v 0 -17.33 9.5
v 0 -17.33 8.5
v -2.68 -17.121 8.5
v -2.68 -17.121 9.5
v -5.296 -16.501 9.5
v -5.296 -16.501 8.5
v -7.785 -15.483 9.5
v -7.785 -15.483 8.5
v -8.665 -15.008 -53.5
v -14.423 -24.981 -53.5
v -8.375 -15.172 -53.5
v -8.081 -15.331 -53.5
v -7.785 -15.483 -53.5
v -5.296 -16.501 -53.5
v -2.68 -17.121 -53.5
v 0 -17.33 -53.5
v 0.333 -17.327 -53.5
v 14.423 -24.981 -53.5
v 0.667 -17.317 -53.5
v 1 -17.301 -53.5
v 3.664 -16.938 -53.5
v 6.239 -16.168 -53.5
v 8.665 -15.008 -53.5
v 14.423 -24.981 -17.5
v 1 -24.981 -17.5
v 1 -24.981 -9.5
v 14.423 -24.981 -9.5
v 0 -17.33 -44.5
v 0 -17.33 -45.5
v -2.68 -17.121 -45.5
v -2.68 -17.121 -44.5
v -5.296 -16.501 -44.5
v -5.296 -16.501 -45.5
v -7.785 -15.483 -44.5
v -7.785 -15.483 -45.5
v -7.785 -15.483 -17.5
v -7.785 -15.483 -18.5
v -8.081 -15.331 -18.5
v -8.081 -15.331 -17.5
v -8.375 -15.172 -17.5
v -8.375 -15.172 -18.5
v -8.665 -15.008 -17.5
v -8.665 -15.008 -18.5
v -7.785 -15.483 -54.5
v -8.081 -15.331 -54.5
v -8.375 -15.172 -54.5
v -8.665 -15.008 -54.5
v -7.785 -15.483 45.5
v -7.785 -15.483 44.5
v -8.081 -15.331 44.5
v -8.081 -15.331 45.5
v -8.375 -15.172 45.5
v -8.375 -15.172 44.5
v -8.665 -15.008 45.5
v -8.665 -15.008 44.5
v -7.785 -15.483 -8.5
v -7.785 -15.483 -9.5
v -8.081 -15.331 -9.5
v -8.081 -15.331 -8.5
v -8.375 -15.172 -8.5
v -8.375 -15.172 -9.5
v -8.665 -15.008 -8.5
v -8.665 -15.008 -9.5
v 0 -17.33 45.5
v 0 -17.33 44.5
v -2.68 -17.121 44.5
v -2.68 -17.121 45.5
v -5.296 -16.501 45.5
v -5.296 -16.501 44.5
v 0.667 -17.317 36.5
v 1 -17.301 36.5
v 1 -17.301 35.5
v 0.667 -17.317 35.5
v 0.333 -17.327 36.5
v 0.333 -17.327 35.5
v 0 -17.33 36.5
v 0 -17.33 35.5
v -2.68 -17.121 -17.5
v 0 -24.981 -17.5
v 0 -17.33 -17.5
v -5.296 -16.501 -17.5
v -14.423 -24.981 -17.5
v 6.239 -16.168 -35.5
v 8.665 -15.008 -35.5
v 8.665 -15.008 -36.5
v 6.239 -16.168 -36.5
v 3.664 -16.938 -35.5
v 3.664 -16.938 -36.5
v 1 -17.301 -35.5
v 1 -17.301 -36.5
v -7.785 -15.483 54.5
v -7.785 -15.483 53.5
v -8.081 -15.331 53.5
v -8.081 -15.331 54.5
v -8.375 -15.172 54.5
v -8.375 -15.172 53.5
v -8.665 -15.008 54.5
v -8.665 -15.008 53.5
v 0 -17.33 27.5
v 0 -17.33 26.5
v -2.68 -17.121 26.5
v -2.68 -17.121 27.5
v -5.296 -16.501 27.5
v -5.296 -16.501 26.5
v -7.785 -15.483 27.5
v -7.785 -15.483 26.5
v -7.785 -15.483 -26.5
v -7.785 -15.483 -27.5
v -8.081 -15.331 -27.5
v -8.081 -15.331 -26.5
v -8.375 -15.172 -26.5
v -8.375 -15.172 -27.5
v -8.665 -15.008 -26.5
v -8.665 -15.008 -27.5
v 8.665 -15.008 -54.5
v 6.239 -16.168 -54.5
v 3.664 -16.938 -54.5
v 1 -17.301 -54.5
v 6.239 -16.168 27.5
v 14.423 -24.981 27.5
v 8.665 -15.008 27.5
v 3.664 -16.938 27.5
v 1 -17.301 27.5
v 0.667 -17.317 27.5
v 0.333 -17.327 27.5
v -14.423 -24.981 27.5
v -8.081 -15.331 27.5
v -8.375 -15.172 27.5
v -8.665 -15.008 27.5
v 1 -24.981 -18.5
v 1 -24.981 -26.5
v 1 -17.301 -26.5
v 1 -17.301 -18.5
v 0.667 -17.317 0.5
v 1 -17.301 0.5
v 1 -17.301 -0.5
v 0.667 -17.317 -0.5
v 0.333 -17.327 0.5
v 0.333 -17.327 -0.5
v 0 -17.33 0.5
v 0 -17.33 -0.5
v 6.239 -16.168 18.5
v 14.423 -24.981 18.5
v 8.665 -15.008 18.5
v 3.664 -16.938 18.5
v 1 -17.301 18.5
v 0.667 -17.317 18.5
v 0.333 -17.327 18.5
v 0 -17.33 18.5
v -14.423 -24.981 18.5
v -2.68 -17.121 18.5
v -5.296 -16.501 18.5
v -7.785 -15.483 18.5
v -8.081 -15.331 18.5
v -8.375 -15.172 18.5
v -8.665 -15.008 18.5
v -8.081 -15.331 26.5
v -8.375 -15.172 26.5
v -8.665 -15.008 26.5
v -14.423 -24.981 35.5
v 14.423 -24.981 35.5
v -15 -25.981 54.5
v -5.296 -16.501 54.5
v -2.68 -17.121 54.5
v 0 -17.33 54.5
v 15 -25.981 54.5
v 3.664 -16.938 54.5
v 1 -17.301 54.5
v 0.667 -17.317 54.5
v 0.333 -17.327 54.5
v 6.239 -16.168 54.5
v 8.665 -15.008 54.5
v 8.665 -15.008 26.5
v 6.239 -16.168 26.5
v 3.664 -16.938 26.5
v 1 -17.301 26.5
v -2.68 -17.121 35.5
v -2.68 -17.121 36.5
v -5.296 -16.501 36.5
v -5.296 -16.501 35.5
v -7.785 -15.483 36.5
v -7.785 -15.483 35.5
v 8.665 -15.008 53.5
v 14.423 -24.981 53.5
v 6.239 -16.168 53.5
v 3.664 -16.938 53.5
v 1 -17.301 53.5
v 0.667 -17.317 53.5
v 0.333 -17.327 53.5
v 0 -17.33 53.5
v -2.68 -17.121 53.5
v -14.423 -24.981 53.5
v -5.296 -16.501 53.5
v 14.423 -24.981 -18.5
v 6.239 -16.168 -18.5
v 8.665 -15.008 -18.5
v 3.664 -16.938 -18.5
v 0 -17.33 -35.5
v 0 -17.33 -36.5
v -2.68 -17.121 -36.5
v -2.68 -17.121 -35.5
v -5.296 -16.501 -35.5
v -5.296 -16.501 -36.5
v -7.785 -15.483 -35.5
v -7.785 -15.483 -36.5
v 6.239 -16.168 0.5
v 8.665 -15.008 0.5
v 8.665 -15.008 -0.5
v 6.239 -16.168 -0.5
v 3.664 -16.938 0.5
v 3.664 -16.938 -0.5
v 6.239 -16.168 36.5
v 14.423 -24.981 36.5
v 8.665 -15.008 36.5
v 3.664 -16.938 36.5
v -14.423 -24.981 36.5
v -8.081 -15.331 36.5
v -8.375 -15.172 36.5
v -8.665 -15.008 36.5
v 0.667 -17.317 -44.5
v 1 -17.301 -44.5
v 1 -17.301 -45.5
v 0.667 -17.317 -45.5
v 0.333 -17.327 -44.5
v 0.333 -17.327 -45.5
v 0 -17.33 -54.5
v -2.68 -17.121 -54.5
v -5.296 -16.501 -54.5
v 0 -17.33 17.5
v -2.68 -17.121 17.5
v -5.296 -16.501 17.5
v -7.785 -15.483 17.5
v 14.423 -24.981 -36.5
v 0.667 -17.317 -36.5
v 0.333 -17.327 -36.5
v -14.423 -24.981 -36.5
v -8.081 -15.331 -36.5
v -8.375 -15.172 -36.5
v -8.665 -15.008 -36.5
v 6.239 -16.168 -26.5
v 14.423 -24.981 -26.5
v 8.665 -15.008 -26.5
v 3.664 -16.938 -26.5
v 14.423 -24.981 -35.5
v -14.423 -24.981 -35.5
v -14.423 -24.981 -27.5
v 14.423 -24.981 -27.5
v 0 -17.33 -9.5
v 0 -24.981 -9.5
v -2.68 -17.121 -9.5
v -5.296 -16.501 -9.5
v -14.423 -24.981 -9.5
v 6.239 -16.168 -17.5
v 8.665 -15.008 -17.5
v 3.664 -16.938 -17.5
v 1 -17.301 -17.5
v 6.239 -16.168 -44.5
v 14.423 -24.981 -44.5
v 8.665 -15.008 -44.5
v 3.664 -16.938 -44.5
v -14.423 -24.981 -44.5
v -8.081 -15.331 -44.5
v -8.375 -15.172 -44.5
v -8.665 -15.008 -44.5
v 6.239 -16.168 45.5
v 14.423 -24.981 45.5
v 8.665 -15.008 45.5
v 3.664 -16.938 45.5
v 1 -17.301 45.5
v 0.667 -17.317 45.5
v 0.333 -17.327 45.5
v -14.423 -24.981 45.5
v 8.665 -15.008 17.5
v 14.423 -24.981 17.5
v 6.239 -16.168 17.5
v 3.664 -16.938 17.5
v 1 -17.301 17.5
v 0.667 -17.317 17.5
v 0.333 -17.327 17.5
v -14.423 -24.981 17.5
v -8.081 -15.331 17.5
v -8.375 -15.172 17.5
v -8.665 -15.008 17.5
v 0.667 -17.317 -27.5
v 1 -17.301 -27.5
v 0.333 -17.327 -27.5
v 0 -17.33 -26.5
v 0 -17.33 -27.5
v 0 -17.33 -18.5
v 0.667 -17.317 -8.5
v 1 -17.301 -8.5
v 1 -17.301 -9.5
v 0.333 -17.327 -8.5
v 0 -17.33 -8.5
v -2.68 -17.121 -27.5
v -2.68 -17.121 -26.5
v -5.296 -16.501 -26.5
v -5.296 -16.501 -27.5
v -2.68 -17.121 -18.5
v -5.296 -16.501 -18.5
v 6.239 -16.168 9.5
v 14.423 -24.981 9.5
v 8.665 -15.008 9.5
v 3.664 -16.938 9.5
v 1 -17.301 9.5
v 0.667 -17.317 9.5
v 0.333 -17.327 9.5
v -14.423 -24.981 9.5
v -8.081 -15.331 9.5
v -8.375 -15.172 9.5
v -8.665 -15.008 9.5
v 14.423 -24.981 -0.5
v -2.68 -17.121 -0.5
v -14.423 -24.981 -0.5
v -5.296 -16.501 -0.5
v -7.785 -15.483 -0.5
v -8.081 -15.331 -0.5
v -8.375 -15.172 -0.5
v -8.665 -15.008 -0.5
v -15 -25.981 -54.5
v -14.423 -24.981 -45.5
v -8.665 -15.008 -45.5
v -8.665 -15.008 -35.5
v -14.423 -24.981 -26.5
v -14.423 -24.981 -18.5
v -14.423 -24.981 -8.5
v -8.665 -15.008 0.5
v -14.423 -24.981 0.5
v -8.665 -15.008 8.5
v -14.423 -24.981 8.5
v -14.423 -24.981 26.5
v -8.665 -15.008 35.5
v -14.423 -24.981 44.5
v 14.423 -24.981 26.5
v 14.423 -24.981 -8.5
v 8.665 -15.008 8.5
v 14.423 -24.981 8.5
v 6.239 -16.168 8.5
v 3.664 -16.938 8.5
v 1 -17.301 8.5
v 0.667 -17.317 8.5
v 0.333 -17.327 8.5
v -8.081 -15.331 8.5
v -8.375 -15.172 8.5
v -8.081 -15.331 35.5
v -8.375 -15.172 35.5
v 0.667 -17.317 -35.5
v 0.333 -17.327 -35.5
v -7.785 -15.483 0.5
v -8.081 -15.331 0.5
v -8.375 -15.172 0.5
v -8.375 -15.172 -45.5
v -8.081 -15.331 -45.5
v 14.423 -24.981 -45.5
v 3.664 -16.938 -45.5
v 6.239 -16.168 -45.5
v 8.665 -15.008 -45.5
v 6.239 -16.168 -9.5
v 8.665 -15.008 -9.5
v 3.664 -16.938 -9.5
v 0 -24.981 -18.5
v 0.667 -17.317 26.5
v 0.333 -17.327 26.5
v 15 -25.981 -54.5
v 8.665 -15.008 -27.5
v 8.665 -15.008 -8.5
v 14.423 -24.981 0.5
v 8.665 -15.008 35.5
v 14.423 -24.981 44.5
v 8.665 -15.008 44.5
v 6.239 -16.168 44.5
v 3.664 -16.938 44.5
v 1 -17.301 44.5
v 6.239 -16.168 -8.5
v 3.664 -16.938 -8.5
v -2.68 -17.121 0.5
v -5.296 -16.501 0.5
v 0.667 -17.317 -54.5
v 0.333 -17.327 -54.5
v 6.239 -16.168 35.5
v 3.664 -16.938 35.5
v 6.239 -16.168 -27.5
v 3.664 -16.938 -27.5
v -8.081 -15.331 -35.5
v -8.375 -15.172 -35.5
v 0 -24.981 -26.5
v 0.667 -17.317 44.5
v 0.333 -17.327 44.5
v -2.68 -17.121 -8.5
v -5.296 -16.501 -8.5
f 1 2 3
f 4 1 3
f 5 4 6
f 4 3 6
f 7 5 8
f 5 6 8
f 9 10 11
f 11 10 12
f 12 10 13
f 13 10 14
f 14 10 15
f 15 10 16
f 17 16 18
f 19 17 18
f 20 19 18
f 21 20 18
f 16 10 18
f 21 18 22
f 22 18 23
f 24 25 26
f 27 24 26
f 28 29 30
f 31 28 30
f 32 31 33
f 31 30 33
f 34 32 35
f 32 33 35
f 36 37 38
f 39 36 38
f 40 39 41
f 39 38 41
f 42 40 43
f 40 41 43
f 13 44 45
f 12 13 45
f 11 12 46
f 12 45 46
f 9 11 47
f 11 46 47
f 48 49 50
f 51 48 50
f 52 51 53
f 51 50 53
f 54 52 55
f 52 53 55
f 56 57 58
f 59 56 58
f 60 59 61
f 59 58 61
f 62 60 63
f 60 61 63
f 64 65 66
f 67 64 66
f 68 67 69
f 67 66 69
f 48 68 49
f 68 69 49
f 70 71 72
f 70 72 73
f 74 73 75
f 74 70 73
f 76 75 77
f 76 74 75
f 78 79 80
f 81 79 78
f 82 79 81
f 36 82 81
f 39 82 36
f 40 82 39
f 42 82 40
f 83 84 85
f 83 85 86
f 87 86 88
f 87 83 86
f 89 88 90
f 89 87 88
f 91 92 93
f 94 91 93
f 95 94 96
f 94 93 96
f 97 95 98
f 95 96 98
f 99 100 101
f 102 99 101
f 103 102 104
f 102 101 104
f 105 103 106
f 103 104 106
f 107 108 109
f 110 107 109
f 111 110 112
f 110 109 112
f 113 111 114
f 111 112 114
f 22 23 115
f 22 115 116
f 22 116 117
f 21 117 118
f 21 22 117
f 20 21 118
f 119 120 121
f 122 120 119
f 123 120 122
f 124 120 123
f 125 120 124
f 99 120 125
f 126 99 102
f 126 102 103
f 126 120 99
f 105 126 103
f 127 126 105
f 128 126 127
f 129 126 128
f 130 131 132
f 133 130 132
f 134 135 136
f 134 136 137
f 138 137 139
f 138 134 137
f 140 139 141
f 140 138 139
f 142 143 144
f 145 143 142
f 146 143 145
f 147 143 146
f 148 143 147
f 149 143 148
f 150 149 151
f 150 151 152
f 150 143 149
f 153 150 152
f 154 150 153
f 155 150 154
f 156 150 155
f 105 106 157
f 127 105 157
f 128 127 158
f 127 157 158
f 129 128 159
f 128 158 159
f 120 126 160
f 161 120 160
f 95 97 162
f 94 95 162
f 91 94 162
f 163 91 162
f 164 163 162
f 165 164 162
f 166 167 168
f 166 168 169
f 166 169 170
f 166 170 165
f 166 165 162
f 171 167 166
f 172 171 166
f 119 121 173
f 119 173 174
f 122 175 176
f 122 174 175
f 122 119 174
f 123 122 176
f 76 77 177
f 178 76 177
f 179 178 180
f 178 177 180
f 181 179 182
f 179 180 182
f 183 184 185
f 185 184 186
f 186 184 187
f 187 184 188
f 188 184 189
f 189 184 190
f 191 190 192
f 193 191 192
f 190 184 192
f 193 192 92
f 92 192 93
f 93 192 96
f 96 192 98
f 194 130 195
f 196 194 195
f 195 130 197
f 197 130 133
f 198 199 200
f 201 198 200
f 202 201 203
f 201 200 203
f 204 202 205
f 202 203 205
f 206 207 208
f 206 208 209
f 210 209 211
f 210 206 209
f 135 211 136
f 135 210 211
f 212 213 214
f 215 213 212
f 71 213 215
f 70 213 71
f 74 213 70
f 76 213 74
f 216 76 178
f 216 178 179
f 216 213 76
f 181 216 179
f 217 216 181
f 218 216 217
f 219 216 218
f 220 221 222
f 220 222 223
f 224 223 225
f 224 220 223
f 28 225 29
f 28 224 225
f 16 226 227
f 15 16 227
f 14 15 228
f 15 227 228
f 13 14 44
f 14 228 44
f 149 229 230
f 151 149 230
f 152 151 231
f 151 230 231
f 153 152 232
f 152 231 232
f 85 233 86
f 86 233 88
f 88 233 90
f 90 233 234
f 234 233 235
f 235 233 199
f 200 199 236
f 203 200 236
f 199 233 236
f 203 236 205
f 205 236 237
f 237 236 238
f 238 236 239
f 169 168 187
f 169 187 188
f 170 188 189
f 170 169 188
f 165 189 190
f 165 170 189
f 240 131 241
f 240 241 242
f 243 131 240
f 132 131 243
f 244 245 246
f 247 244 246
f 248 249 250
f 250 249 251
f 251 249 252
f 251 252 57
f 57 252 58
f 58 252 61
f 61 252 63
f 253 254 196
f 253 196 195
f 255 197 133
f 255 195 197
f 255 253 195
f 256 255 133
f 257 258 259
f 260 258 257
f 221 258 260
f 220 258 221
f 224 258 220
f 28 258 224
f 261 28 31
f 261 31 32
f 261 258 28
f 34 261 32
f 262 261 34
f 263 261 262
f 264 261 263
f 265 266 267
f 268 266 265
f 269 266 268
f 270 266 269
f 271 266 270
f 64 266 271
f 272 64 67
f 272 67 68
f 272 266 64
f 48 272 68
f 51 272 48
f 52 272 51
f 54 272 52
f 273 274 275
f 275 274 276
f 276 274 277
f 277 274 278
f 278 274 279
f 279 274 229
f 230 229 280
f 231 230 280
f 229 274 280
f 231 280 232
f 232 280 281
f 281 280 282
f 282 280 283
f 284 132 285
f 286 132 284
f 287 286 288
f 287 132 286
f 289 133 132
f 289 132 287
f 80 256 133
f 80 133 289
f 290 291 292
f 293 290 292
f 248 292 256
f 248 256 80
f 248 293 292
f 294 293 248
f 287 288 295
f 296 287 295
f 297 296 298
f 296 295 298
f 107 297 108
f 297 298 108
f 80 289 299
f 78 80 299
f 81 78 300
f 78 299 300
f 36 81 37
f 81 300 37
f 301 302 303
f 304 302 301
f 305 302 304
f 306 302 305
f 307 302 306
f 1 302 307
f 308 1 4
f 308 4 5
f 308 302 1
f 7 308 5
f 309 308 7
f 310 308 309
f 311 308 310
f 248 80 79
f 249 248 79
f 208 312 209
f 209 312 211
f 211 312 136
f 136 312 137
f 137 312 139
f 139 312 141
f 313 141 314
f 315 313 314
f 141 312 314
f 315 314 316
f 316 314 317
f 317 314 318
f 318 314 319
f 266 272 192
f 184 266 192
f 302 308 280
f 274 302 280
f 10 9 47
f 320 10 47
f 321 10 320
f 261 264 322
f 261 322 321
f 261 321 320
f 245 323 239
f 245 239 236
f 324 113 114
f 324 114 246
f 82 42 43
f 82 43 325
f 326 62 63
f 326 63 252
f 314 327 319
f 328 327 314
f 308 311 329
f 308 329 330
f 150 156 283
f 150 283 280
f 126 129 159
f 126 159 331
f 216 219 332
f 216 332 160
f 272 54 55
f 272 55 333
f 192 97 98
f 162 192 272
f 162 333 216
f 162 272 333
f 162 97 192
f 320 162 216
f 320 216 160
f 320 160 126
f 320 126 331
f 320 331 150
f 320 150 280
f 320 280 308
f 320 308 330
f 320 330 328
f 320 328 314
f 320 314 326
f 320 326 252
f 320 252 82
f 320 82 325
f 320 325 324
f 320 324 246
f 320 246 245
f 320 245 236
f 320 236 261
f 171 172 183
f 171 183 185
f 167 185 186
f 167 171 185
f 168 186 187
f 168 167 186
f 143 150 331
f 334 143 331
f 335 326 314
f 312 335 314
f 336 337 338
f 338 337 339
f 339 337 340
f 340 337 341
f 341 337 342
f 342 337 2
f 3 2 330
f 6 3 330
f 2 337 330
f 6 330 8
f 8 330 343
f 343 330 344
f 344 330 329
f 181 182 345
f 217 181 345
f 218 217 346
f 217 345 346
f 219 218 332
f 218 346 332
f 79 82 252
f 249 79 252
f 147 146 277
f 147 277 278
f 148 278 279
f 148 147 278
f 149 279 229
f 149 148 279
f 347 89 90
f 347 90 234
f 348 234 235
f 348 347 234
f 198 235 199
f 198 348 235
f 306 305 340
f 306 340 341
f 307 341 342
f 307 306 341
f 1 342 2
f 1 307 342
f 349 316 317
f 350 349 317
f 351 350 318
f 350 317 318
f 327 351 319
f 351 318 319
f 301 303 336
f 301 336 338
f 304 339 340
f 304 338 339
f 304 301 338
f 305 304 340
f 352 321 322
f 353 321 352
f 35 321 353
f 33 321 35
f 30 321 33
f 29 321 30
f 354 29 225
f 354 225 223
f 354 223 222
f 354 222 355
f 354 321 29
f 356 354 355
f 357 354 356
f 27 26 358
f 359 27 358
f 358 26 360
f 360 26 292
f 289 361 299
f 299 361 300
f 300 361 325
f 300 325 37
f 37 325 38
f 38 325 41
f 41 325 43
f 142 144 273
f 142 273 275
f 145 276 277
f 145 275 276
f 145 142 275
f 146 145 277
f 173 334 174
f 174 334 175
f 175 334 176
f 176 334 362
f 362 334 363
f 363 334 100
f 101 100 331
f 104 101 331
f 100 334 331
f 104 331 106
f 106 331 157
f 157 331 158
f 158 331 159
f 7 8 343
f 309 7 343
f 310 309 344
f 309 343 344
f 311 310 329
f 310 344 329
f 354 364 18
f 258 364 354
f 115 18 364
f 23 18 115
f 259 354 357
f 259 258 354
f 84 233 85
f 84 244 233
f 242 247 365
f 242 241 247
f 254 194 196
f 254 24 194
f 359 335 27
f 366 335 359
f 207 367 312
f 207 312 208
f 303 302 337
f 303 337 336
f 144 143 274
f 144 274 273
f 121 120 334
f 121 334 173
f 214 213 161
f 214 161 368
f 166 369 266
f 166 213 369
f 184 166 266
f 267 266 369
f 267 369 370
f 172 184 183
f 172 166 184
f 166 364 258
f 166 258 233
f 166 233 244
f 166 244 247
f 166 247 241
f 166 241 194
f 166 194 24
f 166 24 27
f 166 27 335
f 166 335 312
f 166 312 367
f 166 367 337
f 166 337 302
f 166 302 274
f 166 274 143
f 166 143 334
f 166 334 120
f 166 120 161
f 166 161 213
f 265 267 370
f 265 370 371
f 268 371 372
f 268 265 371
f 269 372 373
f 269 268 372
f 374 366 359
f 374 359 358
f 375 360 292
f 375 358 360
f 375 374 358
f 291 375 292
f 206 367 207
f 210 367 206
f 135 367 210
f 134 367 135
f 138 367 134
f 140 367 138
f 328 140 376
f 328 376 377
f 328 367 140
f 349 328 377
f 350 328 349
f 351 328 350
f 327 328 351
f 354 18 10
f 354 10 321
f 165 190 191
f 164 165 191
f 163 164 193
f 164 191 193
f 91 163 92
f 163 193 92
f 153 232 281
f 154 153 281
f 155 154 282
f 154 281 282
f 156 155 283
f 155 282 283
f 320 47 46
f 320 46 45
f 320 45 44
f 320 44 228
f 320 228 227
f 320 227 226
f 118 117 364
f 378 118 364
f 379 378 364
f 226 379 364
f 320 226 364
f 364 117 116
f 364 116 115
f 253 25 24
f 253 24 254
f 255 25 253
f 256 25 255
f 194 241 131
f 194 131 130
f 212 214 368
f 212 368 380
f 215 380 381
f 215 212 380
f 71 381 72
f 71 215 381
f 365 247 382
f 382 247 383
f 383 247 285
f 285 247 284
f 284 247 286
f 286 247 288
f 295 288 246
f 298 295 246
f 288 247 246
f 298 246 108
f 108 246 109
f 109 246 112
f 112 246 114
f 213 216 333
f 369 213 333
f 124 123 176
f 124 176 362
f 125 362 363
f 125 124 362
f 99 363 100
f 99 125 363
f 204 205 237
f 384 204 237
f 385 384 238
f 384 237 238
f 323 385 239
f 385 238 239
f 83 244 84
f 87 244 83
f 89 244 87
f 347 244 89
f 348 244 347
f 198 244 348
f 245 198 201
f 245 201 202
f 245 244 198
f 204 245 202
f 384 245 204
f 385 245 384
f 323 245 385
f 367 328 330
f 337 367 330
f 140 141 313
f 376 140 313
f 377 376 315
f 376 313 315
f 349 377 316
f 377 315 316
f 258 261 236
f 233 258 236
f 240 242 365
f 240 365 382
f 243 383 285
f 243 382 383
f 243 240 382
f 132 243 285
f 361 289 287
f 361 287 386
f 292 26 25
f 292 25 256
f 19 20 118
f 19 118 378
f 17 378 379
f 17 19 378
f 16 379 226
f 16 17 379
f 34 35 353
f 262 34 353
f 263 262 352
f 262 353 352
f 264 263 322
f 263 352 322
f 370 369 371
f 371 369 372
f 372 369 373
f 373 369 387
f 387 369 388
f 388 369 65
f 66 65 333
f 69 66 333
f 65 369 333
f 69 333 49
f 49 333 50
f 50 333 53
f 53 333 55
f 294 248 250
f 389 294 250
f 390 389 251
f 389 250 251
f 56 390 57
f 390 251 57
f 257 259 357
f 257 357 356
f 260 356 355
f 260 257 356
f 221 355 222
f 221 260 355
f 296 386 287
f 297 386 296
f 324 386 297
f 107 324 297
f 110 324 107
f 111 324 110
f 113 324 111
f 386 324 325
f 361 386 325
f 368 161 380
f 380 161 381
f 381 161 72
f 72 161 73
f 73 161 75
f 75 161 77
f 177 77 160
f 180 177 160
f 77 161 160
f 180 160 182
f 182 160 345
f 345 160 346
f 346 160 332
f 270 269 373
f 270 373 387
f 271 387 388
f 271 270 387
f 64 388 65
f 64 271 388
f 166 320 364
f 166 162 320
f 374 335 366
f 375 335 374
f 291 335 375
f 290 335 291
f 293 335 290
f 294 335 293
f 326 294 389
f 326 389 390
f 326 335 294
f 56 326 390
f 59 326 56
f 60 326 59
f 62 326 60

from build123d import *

# Parameters (mm, degrees)
F1_DEPTH = 54.5
F2_W     = 11
F2_H     = 8
F3_DEPTH = 17.5
F4_START = -9.5
F4_DEPTH = 17.7


with BuildPart() as f1:
    # F0 (on Top) → F1 (new body, symmetric)
    with BuildSketch(Plane.XY):
        with BuildLine():
            Line((-15, -25.9807621135), (-13.8452994616, -25.9807621135))
            Line((-13.8452994616, -25.9807621135), (-7.7845367167, -15.4832131067))
            ThreePointArc((-7.7845367167, -15.4832131067), (-8.2281965887, -15.2520713642), (-8.665, -15.0082202476))
            Line((-8.665, -15.0082202476), (-15, -25.9807621135))
        make_face()
        with BuildLine():
            Line((-13.8452994616, -25.9807621135), (0, -25.9807621135))
            Line((0, -25.9807621135), (0, -17.33))
            ThreePointArc((0, -17.33), (-4.0003010425, -16.8619836191), (-7.7845367167, -15.4832131067))
            Line((-7.7845367167, -15.4832131067), (-13.8452994616, -25.9807621135))
        make_face()
        with BuildLine():
            Line((0, -25.9807621135), (1, -25.9807621135))
            Line((1, -25.9807621135), (1, -17.3011242409))
            ThreePointArc((1, -17.3011242409), (0.5002084089, -17.3227795561), (0, -17.33))
            Line((0, -17.33), (0, -25.9807621135))
        make_face()
        with BuildLine():
            Line((1, -25.9807621135), (15, -25.9807621135))
            Line((15, -25.9807621135), (8.665, -15.0082202476))
            ThreePointArc((8.665, -15.0082202476), (4.9666294839, -16.6030566936), (1, -17.3011242409))
            Line((1, -17.3011242409), (1, -25.9807621135))
        make_face()
    extrude(amount=F1_DEPTH, both=True)

    # F2 (on Right) → F3 (cut, symmetric)
    with BuildSketch(Plane.YZ):
        with Locations((-19.4807621135, 49.5)):
            Rectangle(F2_W, F2_H)
        with Locations((-19.4807621135, 40.5)):
            Rectangle(F2_W, F2_H)
        with Locations((-19.4807621135, 31.5)):
            Rectangle(F2_W, F2_H)
        with Locations((-19.4807621135, 22.5)):
            Rectangle(F2_W, F2_H)
        with Locations((-19.4807621135, 13.5)):
            Rectangle(F2_W, F2_H)
        with Locations((-19.4807621135, 4.5)):
            Rectangle(F2_W, F2_H)
        with Locations((-19.4807621135, -4.5)):
            Rectangle(F2_W, F2_H)
        with Locations((-19.4807621135, -13.5)):
            Rectangle(F2_W, F2_H)
        with Locations((-19.4807621135, -22.5)):
            Rectangle(F2_W, F2_H)
        with Locations((-19.4807621135, -31.5)):
            Rectangle(F2_W, F2_H)
        with Locations((-19.4807621135, -40.5)):
            Rectangle(F2_W, F2_H)
        with Locations((-19.4807621135, -49.5)):
            Rectangle(F2_W, F2_H)
    extrude(amount=F3_DEPTH, both=True, mode=Mode.SUBTRACT)

    # F0 (on Top) → F4 (join)
    with BuildSketch(Plane.XY.offset(F4_START)):
        with BuildLine():
            Line((0, -25.9807621135), (1, -25.9807621135))
            Line((1, -25.9807621135), (1, -17.3011242409))
            ThreePointArc((1, -17.3011242409), (0.5002084089, -17.3227795561), (0, -17.33))
            Line((0, -17.33), (0, -25.9807621135))
        make_face()
    extrude(amount=-F4_DEPTH)


solid = f1.part
